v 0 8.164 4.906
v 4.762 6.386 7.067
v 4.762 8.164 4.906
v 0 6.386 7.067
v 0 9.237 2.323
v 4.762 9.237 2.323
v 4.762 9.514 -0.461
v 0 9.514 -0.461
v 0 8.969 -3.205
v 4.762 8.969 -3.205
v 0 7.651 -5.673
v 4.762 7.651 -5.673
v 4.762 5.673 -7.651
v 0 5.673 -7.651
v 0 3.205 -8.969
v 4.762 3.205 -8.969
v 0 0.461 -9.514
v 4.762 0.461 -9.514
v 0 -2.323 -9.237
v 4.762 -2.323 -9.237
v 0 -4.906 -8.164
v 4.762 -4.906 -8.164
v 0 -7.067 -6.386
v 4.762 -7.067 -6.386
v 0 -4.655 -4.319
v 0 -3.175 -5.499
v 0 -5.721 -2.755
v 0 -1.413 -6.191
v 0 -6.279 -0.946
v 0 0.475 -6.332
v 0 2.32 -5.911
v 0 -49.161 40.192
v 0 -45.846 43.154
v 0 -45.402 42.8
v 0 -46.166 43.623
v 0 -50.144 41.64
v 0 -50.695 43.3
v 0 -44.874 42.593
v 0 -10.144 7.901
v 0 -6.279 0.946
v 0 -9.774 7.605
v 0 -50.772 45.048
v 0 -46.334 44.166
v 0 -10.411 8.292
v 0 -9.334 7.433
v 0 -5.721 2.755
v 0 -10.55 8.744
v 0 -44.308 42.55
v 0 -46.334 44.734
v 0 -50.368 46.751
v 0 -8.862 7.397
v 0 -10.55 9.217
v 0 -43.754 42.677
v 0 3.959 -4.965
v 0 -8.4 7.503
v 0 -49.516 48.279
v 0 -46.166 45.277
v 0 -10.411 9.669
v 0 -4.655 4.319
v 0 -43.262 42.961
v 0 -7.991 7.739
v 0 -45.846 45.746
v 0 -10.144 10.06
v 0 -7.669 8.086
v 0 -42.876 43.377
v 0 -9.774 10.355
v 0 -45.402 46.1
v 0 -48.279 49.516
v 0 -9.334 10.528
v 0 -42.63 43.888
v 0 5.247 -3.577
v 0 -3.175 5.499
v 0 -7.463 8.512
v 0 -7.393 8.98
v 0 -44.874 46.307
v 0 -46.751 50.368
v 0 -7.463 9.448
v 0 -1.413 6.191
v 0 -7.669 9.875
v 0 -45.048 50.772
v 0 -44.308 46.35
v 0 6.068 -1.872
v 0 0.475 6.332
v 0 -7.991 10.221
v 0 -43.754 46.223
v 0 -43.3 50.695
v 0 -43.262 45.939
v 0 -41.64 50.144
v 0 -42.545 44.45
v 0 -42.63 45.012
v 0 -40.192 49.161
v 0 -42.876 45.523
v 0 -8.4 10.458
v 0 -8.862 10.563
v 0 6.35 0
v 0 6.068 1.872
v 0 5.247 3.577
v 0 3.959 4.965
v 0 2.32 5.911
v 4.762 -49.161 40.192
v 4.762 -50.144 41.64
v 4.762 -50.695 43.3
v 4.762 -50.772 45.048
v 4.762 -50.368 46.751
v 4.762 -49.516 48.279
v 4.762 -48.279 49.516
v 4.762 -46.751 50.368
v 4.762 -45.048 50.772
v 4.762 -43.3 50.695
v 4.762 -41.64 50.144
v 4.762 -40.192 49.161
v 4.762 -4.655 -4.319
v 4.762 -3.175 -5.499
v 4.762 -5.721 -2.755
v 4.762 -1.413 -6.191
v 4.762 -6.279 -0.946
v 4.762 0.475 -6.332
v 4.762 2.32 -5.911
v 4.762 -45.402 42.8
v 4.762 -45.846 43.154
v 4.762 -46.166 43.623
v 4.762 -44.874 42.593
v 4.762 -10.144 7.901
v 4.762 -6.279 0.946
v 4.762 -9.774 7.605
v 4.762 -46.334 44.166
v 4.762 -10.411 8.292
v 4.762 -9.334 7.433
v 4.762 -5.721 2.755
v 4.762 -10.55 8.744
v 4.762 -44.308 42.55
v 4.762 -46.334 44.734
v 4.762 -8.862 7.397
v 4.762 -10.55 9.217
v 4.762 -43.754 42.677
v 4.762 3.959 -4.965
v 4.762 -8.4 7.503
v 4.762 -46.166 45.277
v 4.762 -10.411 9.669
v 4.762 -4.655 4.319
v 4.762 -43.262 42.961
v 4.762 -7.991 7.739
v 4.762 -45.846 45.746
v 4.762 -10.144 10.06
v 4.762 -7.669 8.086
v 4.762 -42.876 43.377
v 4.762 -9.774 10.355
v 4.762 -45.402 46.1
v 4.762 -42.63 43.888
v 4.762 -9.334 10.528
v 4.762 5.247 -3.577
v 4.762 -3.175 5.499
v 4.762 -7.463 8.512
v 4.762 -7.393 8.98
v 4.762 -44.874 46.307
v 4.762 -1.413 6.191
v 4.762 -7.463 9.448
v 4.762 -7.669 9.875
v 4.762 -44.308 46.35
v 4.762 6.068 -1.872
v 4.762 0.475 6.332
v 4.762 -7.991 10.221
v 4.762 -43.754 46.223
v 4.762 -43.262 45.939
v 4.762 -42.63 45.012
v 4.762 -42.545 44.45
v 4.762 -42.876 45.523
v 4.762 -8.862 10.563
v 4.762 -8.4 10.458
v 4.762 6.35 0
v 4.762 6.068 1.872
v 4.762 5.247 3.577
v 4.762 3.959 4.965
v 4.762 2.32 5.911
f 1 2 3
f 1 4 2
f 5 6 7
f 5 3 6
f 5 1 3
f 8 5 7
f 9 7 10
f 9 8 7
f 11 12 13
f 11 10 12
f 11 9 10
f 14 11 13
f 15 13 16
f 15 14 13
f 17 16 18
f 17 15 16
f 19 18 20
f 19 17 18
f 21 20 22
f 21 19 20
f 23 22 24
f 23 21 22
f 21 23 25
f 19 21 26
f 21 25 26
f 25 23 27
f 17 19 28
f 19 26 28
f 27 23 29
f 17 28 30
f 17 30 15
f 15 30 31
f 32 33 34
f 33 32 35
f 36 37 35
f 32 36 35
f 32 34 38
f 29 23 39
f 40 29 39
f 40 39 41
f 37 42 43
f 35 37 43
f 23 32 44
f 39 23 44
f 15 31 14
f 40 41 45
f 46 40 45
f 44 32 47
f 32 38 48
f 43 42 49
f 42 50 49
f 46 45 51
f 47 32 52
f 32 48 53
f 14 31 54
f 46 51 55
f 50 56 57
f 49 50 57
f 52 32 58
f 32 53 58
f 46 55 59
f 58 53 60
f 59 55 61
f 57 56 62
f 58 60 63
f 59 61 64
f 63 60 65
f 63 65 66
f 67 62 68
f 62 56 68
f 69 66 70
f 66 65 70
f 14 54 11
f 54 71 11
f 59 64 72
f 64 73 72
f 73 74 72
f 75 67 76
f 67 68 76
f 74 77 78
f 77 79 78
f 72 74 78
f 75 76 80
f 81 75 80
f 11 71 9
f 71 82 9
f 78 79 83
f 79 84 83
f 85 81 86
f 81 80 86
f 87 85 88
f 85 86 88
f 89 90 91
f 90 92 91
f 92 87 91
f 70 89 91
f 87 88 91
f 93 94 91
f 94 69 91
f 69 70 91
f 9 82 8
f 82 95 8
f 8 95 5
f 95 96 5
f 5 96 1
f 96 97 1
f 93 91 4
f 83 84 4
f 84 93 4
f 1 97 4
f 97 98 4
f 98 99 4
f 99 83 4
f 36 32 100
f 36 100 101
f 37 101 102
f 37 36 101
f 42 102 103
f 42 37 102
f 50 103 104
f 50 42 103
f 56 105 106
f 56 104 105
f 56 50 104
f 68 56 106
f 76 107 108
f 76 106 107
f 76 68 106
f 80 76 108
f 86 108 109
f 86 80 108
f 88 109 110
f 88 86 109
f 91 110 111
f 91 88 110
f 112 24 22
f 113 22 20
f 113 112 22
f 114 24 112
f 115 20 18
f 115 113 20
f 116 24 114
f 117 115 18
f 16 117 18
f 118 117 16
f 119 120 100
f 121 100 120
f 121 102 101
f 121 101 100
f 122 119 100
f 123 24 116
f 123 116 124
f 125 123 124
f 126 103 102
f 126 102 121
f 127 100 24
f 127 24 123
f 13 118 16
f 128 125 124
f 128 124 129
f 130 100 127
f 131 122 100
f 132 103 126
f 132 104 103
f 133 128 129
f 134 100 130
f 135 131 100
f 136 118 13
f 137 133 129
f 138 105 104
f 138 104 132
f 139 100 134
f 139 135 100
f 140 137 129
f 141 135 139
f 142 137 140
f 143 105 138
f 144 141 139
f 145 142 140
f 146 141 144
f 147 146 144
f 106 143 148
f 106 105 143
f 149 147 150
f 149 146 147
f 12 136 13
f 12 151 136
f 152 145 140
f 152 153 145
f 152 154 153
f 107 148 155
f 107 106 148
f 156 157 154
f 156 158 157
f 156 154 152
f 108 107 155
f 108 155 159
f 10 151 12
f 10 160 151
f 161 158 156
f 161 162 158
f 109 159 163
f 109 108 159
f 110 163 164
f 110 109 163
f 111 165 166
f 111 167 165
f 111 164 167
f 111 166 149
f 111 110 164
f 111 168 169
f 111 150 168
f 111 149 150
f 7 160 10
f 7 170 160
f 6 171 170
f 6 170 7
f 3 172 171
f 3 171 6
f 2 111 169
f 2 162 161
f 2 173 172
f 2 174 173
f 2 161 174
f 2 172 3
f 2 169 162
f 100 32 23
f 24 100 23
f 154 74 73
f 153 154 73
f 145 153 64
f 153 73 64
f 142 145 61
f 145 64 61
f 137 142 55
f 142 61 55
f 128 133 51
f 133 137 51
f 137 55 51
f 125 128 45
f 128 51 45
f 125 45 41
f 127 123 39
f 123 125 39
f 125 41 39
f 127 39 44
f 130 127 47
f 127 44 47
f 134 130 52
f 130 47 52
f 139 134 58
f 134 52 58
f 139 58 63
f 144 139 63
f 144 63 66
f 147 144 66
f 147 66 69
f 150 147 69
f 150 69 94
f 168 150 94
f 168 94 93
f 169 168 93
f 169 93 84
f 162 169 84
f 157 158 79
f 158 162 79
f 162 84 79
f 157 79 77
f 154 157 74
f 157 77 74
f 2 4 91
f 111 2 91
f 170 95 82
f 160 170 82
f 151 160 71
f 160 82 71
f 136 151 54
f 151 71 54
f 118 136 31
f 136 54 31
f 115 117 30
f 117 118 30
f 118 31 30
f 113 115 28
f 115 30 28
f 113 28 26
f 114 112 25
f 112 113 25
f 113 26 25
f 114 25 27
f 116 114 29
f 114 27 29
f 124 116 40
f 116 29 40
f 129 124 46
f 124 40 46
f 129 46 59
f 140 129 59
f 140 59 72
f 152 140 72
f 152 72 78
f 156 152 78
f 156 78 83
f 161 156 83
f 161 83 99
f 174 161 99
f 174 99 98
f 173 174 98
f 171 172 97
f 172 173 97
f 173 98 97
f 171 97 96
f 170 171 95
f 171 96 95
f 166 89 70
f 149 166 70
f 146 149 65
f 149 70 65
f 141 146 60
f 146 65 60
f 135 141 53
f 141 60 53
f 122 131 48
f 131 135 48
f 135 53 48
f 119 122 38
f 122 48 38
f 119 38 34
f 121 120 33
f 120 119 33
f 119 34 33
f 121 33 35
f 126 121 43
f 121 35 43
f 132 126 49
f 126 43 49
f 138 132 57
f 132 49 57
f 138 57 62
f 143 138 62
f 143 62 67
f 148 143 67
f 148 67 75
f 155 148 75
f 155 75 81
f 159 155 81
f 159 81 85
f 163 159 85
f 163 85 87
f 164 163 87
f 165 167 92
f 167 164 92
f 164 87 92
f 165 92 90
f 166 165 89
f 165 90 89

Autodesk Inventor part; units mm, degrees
ref_plane "YZ Plane" through (0, 0, 0) normal (1, 0, 0) x (0, 1, 0)
ref_plane "XZ Plane" through (0, 0, 0) normal (0, 1, 0) x (-1, 0, 0)
ref_plane "XY Plane" through (0, 0, 0) normal (0, 0, 1) x (1, 0, 0)
sketch "Sketch1" plane through (0, 0, 0) normal (1, 0, 0) x (0, 1, 0)
  circle A0 centre (0, 0) radius 6.35
  circle A1 centre (-44.45, 44.45) radius 1.905
  arc A2 (-40.1924, 49.1612) -> (-49.1612, 40.1924) centre (-44.45, 44.45) ccw
  arc A3 (-7.0668, -6.3864) -> (6.3864, 7.0668) centre (0, 0) ccw
  line L0 (0, 0) -> (0, -9.525) construction
  line L1 (0, 0) -> (-44.45, 44.45) construction
  line L2 (0, 0) -> (-44.45, -44.45) construction
  line L3 (0, 0) -> (-64.9365, 0) construction
  line L4 (-44.45, 44.45) -> (-48.9401, 48.9401) construction
  circle A4 centre (-8.9803, 8.9803) radius 1.5875
  line L5 (-49.1612, 40.1924) -> (-7.0668, -6.3864)
  line L6 (6.3864, 7.0668) -> (-40.1924, 49.1612)
  dimension "d0" = 12.7
  dimension "d1" = 3.81
  dimension "d10" = 12.7
  dimension "d15" = 88.9
  dimension "d16" = 3.175
  dimension "d17" = 12.7
  dimension "d18" = 9.525
extrude "Extrusion1" add sketch "Sketch1" along normal blind 4.7625
properties part number "torque arm"
